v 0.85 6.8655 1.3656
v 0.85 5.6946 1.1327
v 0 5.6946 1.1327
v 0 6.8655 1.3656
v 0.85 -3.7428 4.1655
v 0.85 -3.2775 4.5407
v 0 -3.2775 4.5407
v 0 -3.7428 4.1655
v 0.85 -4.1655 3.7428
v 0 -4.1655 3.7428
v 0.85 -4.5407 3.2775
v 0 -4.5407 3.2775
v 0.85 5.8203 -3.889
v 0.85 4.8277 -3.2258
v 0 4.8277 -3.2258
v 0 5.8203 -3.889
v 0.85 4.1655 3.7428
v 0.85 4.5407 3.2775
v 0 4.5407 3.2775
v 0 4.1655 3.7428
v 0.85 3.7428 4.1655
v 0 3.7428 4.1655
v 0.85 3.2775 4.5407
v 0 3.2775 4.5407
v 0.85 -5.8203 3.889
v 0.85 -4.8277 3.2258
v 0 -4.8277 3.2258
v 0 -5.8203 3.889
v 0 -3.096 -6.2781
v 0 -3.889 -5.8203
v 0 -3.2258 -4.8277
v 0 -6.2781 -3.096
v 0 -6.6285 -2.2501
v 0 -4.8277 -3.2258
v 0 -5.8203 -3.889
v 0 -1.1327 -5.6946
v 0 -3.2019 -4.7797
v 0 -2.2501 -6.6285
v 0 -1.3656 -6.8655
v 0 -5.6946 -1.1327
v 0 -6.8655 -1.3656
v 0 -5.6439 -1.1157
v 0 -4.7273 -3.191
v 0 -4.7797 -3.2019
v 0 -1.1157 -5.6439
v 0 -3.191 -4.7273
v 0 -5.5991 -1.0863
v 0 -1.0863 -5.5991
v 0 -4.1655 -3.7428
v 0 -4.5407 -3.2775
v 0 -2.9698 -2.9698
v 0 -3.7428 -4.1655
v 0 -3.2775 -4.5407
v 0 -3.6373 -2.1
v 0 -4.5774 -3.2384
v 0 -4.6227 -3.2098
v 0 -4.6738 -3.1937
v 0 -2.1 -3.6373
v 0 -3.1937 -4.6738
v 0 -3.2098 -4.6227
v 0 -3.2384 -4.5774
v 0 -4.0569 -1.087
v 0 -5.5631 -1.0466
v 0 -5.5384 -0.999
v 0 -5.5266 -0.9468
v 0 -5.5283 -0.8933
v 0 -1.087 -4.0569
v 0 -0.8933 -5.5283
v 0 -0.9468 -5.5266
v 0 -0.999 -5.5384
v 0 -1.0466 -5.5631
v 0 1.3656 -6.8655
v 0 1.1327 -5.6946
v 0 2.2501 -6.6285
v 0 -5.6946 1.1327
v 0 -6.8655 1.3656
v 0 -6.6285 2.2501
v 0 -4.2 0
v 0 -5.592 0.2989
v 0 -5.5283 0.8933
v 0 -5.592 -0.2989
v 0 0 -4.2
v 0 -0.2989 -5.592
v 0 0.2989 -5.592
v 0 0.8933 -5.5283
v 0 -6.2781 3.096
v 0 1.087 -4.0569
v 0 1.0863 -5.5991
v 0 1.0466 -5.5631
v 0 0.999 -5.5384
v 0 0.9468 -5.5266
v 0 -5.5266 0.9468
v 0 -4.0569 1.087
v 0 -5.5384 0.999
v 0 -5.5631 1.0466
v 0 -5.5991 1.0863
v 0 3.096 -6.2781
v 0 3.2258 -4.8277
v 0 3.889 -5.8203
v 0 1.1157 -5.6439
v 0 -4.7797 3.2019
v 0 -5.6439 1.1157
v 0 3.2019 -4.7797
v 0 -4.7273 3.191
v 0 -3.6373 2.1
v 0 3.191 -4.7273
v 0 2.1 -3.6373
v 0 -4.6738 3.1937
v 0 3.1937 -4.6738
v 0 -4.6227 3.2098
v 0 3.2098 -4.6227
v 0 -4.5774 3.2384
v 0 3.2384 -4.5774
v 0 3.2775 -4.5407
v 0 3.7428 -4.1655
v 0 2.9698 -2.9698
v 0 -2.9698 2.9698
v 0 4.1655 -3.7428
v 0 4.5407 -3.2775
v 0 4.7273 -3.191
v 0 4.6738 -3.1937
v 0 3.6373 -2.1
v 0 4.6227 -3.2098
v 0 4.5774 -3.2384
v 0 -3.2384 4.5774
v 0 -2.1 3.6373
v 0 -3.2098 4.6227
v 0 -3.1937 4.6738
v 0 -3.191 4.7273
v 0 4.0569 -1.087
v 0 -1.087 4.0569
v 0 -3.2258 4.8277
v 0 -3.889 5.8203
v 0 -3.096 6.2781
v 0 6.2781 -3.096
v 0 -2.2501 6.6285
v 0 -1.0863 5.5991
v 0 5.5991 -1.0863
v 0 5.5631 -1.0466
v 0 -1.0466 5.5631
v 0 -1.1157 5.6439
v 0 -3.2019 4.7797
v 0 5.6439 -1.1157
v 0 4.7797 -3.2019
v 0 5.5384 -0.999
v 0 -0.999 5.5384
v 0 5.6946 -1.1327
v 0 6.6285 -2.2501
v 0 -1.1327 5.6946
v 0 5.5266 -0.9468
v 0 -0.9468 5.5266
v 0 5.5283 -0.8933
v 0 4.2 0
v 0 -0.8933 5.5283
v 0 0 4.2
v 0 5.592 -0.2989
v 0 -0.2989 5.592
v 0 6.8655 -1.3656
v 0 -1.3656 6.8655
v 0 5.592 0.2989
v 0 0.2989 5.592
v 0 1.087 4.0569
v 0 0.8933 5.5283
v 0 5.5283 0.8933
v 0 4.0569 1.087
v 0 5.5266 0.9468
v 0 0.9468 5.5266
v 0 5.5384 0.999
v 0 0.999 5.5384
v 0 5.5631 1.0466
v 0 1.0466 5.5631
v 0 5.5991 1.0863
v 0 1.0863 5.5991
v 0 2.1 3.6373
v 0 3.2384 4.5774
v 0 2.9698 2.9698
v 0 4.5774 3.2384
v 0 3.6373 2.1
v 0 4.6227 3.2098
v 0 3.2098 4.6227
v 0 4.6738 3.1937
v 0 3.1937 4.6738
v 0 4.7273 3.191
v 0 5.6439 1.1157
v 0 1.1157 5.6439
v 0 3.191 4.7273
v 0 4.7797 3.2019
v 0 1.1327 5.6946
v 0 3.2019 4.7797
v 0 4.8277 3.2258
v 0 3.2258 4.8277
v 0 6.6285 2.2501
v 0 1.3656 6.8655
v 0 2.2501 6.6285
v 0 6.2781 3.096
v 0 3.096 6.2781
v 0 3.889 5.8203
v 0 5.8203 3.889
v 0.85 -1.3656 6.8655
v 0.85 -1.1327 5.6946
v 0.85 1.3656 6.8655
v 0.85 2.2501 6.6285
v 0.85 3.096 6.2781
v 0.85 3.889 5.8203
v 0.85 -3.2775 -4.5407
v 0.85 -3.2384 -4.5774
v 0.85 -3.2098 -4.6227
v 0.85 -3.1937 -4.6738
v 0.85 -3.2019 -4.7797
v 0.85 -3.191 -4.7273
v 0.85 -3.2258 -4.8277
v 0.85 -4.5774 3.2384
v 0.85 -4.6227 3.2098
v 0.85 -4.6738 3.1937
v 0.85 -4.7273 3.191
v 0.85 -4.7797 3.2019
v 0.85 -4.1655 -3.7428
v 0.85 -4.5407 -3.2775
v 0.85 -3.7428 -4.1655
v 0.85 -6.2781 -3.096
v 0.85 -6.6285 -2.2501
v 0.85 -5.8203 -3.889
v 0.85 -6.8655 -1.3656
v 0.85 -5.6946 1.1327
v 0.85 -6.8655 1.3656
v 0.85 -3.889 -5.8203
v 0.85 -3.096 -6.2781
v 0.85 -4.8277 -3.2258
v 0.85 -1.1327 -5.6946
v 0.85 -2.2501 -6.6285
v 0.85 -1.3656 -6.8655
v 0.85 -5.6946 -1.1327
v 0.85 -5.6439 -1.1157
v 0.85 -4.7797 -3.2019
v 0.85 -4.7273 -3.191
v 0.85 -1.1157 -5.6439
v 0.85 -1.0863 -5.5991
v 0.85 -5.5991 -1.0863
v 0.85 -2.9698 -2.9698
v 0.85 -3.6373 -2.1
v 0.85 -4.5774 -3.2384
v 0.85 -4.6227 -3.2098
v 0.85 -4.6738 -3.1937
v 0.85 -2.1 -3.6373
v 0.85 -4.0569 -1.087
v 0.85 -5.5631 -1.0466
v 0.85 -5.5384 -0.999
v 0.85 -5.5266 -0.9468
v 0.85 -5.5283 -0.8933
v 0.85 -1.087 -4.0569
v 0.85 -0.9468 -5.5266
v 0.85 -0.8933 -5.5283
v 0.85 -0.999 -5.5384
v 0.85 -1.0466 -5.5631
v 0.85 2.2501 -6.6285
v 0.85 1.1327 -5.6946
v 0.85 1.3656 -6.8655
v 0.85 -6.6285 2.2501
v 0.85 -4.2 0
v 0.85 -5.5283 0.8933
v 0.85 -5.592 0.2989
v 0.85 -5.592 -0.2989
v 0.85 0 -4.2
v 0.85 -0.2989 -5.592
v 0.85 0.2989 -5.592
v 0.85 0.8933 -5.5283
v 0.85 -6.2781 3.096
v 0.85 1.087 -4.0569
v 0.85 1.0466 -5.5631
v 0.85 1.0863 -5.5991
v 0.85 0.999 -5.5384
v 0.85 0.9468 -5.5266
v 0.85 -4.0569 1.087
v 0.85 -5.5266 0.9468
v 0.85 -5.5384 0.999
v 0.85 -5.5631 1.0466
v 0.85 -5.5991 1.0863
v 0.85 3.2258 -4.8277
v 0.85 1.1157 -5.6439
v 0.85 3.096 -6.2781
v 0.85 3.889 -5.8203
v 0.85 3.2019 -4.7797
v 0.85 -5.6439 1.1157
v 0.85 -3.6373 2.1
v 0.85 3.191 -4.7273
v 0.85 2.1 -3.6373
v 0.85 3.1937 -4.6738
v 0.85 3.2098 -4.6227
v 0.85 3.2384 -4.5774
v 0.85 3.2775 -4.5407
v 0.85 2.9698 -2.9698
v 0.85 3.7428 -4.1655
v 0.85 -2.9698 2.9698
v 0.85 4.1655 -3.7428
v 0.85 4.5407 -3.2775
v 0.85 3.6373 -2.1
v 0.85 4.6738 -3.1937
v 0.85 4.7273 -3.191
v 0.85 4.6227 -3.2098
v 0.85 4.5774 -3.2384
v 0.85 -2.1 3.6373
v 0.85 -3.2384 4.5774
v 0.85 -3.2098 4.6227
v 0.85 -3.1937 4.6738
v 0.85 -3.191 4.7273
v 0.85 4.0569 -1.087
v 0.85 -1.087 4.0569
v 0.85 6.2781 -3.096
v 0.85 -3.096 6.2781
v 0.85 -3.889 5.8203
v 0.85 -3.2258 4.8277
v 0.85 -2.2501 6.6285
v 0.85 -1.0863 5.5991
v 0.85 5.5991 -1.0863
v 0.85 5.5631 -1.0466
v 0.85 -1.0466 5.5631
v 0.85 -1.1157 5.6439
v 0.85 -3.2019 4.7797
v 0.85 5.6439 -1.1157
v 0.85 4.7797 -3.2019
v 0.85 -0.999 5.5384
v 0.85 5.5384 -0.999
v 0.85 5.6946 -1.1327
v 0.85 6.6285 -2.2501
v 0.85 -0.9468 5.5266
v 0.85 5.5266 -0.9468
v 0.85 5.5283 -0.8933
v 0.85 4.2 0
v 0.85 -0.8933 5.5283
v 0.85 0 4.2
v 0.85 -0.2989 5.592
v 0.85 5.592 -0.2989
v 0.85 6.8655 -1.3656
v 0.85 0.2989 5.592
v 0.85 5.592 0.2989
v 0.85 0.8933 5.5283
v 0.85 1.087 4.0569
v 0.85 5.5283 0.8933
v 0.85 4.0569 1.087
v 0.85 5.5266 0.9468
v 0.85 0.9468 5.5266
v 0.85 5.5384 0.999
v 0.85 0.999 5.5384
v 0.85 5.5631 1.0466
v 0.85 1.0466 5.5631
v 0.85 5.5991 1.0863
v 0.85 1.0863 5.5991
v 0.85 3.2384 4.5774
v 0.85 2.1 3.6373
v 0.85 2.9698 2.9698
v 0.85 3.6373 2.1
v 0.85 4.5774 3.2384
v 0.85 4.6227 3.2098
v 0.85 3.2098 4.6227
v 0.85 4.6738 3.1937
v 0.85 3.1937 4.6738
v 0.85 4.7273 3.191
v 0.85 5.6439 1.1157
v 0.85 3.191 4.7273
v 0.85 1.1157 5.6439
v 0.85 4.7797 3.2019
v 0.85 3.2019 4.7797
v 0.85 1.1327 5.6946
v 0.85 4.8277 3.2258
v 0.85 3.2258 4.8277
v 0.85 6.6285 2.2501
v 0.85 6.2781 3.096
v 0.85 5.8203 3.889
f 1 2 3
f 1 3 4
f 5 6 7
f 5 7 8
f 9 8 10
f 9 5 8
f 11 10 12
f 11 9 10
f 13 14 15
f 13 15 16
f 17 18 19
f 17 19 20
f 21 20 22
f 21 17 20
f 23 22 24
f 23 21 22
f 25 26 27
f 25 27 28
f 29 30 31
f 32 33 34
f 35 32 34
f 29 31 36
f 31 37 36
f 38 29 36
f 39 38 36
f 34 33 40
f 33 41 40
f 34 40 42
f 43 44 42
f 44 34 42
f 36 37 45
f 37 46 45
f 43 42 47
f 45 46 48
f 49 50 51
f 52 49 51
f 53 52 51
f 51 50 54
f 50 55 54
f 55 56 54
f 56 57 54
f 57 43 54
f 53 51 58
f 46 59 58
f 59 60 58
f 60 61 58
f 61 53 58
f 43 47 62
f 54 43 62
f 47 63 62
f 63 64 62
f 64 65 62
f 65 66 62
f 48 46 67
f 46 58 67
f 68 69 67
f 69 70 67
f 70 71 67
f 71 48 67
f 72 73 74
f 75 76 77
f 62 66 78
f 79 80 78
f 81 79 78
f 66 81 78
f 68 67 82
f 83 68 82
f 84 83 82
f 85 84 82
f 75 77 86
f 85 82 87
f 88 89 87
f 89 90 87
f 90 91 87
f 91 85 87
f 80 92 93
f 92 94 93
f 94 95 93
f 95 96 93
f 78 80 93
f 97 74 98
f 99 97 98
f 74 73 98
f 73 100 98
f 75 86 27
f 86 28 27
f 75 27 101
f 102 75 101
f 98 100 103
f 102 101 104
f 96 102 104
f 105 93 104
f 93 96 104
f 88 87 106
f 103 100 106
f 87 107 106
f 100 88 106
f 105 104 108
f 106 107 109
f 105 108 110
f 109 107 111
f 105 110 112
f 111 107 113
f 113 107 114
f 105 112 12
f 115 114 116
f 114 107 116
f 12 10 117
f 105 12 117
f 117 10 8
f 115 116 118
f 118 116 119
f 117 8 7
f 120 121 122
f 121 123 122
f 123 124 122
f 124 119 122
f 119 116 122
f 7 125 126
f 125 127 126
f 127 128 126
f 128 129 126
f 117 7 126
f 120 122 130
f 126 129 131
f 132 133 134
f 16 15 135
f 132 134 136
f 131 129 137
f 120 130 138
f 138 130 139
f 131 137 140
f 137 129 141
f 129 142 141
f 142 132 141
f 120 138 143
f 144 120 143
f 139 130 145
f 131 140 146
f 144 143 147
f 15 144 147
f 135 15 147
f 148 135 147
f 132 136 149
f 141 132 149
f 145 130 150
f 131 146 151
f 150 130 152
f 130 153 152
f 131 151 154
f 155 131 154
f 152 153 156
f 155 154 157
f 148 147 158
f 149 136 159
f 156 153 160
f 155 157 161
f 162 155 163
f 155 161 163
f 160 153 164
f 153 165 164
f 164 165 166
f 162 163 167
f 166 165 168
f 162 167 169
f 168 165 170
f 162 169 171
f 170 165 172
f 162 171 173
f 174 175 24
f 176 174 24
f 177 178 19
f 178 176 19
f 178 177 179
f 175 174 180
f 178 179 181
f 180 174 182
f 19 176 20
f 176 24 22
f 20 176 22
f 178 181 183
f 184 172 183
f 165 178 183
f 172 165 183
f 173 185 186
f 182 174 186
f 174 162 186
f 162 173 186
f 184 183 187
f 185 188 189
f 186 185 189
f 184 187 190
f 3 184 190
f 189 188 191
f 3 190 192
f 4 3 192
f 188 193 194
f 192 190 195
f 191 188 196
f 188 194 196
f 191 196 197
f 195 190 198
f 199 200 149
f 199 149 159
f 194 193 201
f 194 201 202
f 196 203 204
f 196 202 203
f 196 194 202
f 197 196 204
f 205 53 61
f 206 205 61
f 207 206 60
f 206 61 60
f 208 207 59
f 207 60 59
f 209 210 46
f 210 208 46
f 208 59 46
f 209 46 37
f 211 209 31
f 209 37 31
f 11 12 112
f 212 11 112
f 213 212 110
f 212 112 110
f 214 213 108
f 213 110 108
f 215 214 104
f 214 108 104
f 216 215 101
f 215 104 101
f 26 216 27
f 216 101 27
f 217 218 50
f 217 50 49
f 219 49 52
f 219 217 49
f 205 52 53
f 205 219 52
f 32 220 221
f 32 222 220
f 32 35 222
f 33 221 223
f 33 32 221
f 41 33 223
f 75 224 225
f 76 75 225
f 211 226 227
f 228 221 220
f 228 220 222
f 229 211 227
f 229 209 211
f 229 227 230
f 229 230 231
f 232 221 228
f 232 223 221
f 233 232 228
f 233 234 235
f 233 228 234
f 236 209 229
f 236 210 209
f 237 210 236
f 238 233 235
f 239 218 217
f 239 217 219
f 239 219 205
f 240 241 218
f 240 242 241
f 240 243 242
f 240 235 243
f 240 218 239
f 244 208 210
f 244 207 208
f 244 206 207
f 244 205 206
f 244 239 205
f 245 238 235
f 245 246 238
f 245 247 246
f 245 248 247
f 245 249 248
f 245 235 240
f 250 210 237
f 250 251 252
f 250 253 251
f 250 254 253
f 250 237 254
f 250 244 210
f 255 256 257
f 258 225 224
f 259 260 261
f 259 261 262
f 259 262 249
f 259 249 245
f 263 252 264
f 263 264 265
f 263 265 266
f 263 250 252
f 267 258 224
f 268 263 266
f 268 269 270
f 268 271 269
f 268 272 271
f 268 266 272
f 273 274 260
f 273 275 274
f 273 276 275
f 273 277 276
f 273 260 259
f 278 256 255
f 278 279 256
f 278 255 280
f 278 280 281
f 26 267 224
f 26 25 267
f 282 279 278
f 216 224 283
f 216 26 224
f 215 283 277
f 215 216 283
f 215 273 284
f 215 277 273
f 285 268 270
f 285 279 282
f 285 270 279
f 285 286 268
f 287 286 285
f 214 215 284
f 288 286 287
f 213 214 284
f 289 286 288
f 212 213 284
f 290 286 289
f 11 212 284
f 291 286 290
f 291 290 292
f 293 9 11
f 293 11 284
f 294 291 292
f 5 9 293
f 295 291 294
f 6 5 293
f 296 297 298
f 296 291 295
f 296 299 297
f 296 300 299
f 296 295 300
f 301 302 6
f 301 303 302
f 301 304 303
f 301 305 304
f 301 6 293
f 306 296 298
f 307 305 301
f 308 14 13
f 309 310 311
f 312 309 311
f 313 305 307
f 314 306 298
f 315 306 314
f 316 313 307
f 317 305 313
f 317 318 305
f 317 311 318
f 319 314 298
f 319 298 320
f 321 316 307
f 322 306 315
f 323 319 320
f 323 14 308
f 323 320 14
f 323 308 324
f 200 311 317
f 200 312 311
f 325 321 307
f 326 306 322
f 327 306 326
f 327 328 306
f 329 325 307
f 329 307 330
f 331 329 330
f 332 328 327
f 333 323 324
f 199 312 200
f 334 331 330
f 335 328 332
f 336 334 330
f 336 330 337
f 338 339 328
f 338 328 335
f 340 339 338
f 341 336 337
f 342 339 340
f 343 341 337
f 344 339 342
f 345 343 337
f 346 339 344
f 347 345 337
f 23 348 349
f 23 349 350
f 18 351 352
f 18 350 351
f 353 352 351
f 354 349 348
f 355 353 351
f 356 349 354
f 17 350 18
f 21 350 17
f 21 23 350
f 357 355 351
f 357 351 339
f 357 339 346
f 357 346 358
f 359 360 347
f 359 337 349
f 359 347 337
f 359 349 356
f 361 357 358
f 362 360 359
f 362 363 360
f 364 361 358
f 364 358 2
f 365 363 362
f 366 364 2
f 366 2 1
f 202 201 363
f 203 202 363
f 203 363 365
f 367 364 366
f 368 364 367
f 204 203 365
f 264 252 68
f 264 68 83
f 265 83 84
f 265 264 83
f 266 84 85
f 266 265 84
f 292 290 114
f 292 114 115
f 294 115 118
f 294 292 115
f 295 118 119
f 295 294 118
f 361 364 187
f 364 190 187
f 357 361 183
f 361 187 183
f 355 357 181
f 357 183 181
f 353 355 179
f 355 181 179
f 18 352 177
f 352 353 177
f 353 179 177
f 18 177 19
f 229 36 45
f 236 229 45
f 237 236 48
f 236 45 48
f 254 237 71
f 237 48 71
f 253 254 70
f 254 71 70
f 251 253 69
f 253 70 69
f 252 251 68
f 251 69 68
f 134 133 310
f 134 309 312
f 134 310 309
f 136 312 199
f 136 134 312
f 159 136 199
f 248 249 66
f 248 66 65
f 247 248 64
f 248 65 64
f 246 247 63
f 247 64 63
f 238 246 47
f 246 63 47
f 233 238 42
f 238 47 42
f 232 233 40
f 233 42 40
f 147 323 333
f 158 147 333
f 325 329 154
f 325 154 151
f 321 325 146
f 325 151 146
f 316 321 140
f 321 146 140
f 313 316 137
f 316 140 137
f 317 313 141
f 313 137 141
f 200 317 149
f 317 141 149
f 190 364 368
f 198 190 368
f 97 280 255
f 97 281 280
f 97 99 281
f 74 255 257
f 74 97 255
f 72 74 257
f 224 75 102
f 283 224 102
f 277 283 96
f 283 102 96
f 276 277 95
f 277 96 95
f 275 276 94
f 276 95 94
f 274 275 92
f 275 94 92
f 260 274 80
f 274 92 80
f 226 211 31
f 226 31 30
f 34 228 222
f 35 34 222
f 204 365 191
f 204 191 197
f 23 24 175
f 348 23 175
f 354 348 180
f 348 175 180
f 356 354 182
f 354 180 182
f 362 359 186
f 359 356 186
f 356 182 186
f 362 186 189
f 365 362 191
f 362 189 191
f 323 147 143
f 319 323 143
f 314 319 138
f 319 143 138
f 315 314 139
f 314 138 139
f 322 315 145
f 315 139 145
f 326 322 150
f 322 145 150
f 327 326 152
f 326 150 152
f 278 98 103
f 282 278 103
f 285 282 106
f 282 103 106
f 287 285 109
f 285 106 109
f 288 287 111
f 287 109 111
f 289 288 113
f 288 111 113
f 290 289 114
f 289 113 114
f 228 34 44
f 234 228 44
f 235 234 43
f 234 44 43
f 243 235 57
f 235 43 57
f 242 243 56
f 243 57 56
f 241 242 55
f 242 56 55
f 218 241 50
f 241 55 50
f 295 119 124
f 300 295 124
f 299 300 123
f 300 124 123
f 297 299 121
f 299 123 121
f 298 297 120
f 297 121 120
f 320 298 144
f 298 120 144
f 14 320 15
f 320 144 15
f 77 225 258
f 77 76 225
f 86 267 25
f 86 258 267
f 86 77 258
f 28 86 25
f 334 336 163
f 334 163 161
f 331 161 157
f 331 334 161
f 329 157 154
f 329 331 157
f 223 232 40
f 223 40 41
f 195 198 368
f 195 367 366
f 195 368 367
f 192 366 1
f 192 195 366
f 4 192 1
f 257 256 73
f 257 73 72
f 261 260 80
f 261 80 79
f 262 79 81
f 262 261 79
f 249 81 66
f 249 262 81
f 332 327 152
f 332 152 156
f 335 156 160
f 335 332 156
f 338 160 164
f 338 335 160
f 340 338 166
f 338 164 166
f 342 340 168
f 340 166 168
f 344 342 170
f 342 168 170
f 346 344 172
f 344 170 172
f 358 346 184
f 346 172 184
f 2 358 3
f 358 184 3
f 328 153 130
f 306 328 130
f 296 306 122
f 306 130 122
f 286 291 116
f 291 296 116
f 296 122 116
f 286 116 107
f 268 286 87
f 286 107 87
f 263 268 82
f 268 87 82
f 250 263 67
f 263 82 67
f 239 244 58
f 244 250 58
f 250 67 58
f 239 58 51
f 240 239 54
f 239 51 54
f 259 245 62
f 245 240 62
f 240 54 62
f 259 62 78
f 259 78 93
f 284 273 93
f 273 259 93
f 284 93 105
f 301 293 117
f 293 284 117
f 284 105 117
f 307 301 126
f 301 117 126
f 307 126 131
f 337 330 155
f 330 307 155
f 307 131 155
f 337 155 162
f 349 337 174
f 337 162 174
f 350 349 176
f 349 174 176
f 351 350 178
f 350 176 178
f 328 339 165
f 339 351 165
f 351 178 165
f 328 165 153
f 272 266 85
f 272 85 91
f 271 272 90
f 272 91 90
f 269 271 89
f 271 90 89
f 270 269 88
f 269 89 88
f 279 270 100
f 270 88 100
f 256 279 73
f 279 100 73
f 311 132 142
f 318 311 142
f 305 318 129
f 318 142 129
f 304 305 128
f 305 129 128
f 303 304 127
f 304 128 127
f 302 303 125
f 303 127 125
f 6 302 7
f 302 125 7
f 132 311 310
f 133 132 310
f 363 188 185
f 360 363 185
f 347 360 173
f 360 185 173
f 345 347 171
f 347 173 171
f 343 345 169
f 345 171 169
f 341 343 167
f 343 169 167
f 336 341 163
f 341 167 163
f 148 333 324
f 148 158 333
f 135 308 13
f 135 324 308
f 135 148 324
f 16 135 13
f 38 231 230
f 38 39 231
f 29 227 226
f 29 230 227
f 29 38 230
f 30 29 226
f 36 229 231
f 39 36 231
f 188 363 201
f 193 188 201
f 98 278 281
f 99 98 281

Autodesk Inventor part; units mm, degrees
ref_plane "YZ Plane" through (0, 0, 0) normal (1, 0, 0) x (0, 1, 0)
ref_plane "XZ Plane" through (0, 0, 0) normal (0, 1, 0) x (-1, 0, 0)
sketch "Sketch1" plane through (0, 0, 0) normal (1, 0, 0) x (0, 1, 0)
  circle A0 centre (0, 0) radius 7
  circle A1 centre (0, 0) radius 4.2
  dimension "d0" = 14
  dimension "d1" = 8.4
extrude "Body" add sketch "Sketch1" along normal blind 0.85
sketch "Sketch2" plane through (0.85, 0, 0) normal (1, 0, 0) x (0, 0, -1)
  circle A0 centre (0, 0) radius 7 projected
  line L0 (0, 0) -> (0, 7) construction
  arc A1 (1.3656, 6.8655) -> (-1.3656, 6.8655) centre (0, 0) ccw
  arc A2 (1.0925, 5.4924) -> (-1.0925, 5.4924) centre (0, 0) ccw
  line L1 (-1.0925, 5.4924) -> (-1.3656, 6.8655)
  line L2 (1.0925, 5.4924) -> (1.3656, 6.8655)
  line L3 (-1.0925, 5.4924) -> (0, 0) construction
  line L4 (0, 0) -> (1.0925, 5.4924) construction
  dimension "d4" = 22.5
  dimension "d5" = 11.2
extrude "Cut" cut sketch "Sketch2" against normal through all contours L2 A2 L1 A0 picked at (0.1221, 6.5193)
fillet "Fillet1" radius 0.21 2 edges at (0.425, 5.4924, 1.0925) (0.425, 5.4924, -1.0925)
pattern_circular "Cuts" count 8 over 360 about axis through (0, 0, 0) along (1, 0, 0) of "Cut", "Fillet1"
ref_plane "Work Plane1" through (0, 0, 0) normal (0, -1, 0) x (1, 0, 0)
equation "\"d0\" = SD2"
equation "\"d1\" = SD1"
equation "\"d2\" = SD"
equation "\"d5\" = 0.5 * SD2 + 0.5 * SD1"
equation "\"d6\" = SD"
equation "\"d8\" = 0.015 * SD2"
equation "\"SD\" = 0.85"
equation "\"SD1\" = 8.4"
equation "\"SD2\" = 14"
equation "\"NND\" = 8"
properties part number "AS 1969 - M8" material "Steel, Mild"
